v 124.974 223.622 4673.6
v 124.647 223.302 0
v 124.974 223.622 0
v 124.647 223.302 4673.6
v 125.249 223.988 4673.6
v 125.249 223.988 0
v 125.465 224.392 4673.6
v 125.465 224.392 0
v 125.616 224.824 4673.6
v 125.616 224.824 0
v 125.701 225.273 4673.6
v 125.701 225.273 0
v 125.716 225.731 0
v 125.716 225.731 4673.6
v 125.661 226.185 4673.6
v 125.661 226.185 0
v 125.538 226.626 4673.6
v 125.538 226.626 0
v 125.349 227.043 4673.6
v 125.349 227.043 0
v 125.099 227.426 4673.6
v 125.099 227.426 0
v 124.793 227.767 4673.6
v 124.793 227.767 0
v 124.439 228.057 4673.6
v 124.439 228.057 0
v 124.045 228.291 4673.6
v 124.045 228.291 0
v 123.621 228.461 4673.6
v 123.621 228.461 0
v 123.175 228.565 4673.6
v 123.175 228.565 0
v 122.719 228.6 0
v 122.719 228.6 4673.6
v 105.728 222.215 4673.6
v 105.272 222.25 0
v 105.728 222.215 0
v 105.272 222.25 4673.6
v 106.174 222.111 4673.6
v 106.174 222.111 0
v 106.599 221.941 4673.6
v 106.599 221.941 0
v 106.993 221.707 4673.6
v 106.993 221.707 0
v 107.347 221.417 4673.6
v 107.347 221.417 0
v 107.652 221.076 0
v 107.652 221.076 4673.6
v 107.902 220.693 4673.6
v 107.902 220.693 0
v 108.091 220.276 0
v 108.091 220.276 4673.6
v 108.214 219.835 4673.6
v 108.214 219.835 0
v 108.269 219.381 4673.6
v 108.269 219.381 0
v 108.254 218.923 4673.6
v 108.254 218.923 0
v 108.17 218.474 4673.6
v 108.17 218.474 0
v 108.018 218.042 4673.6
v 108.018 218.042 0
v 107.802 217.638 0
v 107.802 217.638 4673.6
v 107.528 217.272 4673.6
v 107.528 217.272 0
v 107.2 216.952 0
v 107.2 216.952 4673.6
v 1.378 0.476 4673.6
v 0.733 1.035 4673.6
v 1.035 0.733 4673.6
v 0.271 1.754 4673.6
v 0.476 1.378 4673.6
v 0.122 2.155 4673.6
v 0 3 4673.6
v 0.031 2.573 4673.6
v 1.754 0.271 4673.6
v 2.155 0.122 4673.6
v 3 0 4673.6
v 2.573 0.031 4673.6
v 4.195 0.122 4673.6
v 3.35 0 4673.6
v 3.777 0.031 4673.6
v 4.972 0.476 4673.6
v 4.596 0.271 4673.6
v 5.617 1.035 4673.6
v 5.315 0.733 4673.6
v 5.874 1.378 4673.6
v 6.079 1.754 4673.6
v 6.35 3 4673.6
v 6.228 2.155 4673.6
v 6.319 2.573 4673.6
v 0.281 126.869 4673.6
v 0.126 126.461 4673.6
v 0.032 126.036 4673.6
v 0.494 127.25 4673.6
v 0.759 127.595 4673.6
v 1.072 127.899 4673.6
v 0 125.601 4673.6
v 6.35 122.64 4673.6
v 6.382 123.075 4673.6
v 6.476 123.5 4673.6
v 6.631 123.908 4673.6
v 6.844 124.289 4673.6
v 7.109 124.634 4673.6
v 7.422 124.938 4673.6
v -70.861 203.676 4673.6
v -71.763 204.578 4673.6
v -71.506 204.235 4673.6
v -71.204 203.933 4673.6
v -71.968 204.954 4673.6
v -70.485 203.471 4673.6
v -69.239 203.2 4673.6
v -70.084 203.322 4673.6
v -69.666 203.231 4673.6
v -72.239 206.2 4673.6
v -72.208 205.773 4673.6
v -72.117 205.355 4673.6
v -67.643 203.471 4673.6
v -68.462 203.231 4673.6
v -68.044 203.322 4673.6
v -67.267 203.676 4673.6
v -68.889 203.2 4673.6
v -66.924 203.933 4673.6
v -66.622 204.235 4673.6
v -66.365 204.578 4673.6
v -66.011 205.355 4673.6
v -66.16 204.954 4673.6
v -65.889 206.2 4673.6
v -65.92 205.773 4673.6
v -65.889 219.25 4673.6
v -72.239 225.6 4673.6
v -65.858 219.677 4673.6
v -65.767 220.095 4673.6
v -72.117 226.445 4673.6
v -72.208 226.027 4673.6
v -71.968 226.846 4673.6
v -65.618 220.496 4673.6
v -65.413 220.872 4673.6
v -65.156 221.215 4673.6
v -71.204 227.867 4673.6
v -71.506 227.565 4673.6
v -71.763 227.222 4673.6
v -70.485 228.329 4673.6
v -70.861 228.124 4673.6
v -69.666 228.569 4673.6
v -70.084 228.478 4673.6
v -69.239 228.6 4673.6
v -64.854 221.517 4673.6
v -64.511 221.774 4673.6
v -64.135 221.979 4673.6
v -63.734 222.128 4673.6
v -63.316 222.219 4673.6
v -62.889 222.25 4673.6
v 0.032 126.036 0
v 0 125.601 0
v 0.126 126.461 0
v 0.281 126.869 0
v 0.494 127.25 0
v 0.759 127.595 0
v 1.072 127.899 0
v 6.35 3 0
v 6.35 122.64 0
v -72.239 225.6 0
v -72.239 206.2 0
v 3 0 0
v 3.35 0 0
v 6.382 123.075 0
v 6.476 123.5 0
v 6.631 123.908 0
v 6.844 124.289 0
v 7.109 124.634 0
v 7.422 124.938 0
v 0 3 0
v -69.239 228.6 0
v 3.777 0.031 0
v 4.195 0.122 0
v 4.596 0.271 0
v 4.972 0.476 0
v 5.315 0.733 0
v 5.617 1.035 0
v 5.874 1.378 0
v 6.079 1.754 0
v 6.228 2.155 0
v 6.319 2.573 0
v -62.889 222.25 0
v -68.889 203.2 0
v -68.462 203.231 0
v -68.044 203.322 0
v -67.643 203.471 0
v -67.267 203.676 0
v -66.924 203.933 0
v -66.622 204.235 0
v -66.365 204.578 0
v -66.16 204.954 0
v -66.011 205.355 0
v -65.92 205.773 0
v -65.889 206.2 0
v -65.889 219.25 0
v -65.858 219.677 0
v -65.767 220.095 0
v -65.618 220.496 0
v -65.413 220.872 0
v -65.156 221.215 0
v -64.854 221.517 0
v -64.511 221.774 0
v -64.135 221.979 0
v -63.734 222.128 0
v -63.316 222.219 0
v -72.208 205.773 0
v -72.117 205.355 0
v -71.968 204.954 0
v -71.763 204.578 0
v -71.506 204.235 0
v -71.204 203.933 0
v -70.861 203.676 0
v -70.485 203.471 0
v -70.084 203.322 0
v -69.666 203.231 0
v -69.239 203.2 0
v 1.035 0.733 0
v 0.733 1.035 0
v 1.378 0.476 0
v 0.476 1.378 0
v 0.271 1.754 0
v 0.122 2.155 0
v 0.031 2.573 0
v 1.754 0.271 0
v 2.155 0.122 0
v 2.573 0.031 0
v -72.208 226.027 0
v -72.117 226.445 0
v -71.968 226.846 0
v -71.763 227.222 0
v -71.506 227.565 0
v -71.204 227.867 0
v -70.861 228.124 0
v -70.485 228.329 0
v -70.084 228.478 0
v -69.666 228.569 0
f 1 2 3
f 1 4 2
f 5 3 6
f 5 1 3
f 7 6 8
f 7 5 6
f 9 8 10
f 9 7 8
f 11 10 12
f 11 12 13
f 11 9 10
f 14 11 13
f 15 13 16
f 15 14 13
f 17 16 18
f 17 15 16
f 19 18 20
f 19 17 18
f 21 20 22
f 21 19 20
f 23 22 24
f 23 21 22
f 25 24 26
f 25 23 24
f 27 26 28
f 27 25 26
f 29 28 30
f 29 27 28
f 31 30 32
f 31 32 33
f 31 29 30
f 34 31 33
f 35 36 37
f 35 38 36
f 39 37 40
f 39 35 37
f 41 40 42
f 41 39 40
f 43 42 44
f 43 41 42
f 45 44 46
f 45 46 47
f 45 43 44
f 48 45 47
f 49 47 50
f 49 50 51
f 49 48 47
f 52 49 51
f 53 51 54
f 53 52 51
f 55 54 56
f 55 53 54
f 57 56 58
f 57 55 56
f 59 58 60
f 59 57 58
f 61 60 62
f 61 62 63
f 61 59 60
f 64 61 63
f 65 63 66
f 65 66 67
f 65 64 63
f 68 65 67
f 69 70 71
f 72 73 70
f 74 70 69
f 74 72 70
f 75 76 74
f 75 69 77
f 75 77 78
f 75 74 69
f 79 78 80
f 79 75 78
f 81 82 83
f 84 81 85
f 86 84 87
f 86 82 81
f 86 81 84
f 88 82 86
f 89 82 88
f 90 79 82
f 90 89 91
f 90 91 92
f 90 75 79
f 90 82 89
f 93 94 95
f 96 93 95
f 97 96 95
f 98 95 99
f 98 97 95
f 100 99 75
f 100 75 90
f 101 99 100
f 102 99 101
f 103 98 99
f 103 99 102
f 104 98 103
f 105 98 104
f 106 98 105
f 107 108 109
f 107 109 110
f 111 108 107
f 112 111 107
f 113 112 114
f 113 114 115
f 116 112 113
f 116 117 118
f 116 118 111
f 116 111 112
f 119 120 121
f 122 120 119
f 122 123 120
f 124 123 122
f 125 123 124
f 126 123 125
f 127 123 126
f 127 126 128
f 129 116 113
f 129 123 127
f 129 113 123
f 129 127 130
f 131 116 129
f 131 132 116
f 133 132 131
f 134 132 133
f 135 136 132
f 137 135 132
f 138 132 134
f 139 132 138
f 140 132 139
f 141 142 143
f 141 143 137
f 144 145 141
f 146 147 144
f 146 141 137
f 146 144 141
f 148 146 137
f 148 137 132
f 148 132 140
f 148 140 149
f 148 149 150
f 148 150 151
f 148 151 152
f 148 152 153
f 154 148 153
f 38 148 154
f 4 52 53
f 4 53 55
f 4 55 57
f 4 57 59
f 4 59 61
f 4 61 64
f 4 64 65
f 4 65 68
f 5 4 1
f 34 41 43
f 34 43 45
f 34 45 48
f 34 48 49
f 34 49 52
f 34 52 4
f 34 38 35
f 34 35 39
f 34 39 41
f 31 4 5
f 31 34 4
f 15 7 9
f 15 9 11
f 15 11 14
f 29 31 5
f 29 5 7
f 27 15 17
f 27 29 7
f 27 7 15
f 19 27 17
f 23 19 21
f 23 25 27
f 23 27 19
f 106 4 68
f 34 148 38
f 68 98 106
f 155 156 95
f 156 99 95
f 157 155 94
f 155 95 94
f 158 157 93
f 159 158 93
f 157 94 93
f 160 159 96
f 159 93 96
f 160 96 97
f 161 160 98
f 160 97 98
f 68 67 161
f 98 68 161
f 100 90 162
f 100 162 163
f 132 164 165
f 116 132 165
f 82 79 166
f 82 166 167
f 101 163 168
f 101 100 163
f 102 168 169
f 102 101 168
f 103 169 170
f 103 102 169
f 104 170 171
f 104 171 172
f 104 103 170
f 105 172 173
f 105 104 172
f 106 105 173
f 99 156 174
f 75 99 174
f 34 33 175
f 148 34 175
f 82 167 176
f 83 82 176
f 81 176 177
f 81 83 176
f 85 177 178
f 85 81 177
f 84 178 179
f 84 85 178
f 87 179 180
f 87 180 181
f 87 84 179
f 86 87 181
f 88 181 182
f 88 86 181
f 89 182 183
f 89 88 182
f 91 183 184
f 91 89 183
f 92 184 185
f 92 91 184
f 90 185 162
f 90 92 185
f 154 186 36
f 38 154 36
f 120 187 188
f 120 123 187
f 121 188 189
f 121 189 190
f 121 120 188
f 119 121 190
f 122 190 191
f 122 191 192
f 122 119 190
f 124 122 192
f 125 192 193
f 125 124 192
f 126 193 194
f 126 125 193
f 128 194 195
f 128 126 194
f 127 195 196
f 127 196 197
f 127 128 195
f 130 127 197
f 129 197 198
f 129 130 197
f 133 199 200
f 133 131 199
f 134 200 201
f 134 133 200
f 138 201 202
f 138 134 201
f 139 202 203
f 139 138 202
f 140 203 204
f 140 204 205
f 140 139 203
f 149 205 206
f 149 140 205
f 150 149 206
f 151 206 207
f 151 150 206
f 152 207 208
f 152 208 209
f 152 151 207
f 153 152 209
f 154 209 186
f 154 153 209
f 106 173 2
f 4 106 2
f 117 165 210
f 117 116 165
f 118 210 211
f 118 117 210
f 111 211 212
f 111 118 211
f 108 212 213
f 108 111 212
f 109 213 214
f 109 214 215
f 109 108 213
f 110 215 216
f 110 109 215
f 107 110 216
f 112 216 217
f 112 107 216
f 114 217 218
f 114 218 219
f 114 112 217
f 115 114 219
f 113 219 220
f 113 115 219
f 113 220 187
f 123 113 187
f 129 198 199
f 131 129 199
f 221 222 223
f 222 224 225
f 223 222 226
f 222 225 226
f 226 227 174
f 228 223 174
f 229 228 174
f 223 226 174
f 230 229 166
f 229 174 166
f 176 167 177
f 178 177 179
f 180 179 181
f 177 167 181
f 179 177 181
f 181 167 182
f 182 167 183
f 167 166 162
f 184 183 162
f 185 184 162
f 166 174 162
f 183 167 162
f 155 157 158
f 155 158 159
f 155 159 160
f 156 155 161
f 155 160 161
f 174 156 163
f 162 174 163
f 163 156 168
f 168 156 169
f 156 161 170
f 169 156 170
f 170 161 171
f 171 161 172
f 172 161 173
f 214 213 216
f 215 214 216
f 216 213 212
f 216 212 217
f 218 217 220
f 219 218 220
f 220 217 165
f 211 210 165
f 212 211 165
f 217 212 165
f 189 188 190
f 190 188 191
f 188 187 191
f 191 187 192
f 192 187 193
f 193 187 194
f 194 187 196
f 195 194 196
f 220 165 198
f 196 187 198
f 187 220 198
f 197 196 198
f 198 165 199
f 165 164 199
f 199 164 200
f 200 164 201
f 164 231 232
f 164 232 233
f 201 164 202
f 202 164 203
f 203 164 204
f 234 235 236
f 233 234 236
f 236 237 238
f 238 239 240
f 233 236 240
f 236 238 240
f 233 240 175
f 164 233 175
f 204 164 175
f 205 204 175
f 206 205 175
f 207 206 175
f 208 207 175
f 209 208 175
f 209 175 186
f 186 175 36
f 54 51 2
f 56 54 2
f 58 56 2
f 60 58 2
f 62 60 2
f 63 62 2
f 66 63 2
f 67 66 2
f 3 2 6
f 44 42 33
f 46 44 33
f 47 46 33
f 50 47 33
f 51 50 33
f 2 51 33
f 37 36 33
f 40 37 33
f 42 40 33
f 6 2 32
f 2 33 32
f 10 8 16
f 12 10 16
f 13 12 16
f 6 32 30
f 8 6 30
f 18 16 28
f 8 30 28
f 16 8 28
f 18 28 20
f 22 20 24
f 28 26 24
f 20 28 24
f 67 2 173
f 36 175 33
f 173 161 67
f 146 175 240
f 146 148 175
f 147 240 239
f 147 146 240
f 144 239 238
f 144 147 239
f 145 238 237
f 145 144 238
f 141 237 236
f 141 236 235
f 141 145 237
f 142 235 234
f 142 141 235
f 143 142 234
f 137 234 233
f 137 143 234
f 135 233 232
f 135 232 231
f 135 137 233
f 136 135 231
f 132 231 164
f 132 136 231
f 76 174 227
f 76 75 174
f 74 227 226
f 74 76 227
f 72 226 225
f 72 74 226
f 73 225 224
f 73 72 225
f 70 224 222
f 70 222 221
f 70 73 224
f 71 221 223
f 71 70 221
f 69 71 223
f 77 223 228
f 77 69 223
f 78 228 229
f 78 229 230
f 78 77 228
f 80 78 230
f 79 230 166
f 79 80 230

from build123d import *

# Parameters (mm, degrees)
F1_DEPTH = 4673.6
F2_R     = 3


with BuildPart() as f1:
    # F0 (on Top) → F1 (new body)
    with BuildSketch(Plane.XY):
        Polygon((0, 127), (0, 0), (6.35, 0), (6.35, 124.038946), (130.961011, 228.6), (-72.238989, 228.6), (-72.238989, 203.2), (-65.888989, 203.2), (-65.888989, 222.25), (113.51453, 222.25), align=None)
    extrude(amount=F1_DEPTH)

    # F2
    f2_edges = [f1.edges().sort_by_distance(p)[0] for p in [
        (-72.238989, 203.2, 2336.8),
        (-72.238989, 228.6, 2336.8),
        (130.961011, 228.6, 2336.8),
        (0, 0, 2336.8),
        (6.35, 0, 2336.8),
        (0, 127, 2336.8),
        (6.35, 124.038946, 2336.8),
        (113.51453, 222.25, 2336.8),
        (-65.888989, 222.25, 2336.8),
        (-65.888989, 203.2, 2336.8),
    ]]
    fillet(f2_edges, radius=F2_R)


solid = f1.part
